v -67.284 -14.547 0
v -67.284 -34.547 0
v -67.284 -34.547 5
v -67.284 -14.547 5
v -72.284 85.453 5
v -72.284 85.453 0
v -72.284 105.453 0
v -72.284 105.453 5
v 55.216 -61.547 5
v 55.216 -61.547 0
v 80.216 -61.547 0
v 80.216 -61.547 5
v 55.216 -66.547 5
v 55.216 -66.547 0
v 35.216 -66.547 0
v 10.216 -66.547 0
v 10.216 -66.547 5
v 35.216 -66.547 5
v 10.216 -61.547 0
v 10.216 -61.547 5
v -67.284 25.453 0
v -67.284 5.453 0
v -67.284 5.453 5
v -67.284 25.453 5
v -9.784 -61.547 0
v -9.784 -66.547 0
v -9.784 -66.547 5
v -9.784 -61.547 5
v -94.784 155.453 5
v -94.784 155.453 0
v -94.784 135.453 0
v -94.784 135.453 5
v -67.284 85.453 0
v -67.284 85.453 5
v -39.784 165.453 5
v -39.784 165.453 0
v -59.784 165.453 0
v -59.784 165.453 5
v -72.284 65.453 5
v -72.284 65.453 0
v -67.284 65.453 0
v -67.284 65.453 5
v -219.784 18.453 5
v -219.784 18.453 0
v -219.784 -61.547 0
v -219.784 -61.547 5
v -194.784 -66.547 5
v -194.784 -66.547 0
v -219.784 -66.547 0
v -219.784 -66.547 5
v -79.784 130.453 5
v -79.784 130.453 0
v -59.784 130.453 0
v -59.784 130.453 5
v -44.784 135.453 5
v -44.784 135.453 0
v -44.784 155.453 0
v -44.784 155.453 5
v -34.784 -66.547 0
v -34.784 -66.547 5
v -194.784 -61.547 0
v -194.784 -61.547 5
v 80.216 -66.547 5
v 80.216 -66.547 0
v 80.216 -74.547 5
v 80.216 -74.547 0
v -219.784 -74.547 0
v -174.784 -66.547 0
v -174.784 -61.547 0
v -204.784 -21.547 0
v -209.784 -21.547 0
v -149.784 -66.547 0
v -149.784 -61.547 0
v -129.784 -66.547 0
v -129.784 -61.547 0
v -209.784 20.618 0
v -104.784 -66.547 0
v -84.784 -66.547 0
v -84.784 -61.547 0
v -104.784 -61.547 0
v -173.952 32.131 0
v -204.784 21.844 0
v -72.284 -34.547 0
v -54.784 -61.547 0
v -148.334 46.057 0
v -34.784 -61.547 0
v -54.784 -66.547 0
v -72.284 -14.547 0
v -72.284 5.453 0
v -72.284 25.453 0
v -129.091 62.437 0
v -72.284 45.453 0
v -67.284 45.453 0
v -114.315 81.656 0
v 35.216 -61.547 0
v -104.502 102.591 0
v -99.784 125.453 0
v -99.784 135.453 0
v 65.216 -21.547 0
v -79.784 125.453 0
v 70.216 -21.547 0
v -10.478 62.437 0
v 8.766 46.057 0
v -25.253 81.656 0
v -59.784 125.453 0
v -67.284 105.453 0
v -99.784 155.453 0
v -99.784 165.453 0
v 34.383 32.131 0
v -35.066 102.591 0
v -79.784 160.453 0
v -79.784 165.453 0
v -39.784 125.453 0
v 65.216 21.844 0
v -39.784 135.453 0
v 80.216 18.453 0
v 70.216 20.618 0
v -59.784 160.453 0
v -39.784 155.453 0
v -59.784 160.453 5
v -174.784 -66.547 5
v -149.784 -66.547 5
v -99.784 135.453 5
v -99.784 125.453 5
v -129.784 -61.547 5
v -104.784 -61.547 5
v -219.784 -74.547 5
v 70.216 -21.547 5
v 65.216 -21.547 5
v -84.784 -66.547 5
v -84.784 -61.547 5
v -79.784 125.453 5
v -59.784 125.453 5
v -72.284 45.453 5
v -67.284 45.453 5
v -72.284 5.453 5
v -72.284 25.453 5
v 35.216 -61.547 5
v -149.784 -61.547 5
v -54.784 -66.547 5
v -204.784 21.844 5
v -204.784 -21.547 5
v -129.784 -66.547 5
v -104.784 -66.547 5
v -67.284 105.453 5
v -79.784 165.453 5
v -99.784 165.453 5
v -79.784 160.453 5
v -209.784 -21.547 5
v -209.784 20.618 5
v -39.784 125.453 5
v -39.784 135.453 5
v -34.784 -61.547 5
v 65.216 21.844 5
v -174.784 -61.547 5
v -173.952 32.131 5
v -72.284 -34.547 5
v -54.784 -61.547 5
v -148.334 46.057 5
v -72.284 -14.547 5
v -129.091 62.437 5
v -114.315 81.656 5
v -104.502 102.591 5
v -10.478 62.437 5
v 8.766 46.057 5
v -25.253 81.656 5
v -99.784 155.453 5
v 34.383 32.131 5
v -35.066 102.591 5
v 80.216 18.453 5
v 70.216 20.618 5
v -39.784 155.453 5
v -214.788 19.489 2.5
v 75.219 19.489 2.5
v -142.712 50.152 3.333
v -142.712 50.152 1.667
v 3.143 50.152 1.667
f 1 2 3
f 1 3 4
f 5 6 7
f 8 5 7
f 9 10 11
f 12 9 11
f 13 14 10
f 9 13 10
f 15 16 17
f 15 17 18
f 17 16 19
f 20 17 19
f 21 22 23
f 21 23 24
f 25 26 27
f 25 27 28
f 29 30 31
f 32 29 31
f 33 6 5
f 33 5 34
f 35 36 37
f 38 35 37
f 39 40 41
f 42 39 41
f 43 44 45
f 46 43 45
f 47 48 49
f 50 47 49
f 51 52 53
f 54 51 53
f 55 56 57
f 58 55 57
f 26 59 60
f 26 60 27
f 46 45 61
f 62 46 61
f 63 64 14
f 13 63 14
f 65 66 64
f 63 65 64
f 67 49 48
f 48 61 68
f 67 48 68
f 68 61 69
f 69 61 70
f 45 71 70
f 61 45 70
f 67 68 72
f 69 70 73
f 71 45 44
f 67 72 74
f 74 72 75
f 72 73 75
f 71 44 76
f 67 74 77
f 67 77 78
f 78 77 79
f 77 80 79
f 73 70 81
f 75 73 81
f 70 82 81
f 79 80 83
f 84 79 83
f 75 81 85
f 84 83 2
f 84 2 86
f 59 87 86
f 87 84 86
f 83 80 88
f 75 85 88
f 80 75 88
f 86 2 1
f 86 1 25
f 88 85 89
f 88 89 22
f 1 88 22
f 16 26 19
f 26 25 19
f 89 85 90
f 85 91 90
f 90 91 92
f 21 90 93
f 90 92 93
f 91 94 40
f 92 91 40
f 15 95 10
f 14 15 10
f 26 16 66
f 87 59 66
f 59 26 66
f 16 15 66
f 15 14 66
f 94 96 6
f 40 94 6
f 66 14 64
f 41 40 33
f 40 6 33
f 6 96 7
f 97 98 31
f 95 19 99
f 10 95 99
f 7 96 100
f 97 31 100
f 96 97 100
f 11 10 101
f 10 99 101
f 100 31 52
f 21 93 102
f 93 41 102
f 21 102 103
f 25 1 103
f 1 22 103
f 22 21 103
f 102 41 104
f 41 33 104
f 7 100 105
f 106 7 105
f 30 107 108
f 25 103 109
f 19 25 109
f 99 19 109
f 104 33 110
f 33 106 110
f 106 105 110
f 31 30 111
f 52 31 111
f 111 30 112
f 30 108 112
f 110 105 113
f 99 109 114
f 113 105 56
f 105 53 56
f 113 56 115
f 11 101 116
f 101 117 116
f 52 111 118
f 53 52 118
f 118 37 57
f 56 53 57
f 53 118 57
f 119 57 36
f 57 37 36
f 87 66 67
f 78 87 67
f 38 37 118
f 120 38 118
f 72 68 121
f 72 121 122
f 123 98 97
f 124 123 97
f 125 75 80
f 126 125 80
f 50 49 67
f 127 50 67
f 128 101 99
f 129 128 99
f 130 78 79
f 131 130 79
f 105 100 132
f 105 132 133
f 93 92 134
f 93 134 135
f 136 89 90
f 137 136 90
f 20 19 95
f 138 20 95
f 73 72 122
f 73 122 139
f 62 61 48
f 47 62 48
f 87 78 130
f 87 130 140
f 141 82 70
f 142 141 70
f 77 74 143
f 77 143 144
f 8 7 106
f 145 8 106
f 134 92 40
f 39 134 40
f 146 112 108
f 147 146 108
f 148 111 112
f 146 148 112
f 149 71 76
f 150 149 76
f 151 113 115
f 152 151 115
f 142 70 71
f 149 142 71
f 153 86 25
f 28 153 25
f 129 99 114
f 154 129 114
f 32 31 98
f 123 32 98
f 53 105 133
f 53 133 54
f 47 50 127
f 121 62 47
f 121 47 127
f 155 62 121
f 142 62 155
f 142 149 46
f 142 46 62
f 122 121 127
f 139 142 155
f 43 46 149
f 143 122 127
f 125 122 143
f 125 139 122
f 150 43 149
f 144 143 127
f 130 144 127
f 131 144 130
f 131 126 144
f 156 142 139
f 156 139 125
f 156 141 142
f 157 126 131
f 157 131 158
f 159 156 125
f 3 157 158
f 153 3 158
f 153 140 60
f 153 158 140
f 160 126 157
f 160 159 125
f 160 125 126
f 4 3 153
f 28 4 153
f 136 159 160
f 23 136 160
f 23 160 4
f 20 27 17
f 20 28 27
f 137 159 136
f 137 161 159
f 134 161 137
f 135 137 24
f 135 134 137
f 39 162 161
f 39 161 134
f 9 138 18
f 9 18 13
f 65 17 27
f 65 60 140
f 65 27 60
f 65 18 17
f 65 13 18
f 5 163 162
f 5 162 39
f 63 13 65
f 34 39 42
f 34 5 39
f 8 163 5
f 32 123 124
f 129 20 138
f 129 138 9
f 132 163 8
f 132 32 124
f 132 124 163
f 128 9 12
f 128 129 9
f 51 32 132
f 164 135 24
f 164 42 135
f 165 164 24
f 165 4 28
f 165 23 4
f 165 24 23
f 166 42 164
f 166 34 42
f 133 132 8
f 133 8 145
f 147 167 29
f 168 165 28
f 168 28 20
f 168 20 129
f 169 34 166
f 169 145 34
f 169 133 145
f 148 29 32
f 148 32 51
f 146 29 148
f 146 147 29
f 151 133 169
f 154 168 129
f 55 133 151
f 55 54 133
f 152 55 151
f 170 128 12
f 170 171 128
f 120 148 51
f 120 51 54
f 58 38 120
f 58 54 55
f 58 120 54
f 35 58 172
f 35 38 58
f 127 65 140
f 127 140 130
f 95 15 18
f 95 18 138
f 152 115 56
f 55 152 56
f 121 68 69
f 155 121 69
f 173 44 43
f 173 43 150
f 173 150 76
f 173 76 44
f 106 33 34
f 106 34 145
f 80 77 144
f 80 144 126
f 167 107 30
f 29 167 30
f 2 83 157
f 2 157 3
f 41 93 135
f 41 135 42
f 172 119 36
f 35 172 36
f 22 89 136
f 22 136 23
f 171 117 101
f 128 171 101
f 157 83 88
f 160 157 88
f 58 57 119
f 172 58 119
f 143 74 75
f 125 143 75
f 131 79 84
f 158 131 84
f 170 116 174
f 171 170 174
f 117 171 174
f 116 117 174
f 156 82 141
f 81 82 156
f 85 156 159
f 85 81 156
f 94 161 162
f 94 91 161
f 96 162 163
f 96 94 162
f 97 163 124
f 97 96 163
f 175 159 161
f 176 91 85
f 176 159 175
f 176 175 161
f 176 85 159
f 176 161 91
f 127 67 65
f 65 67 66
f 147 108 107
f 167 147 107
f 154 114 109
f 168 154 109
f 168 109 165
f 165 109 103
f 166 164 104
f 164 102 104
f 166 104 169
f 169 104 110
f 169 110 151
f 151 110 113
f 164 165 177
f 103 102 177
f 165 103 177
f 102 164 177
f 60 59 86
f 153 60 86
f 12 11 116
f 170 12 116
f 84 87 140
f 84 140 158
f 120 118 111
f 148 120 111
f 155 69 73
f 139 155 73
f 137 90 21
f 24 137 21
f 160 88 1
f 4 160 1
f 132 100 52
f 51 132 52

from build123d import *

# Parameters (mm, degrees)
SKETCH1_W           = 20
SKETCH1_H           = 5
SKETCH1_W_2         = 5
SKETCH1_H_2         = 20
SKETCH1_W_3         = 25
SKETCH1_W_4         = 30
BOSS_EXTRUDE1_DEPTH = 5


with BuildPart() as part:
    # Sketch1 → Boss-Extrude1 (new body)
    with BuildSketch(Plane.XY):
        with BuildLine():
            Line((-39.784412909, 125.453201578), (-39.784412909, 135.453201578))
            Line((-39.784412909, 135.453201578), (-44.784412909, 135.453201578))
            Line((-44.784412909, 135.453201578), (-44.784412909, 155.453201578))
            Line((-44.784412909, 155.453201578), (-39.784412909, 155.453201578))
            Line((-39.784412909, 155.453201578), (-39.784412909, 165.453201578))
            Line((-39.784412909, 165.453201578), (-59.784412909, 165.453201578))
            Line((-59.784412909, 165.453201578), (-59.784412909, 160.453201578))
            Line((-59.784412909, 160.453201578), (-79.784412909, 160.453201578))
            Line((-79.784412909, 160.453201578), (-79.784412909, 165.453201578))
            Line((-79.784412909, 165.453201578), (-99.784412909, 165.453201578))
            Line((-99.784412909, 165.453201578), (-99.784412909, 155.453201578))
            Line((-99.784412909, 155.453201578), (-94.784412909, 155.453201578))
            Line((-94.784412909, 155.453201578), (-94.784412909, 135.453201578))
            Line((-94.784412909, 135.453201578), (-99.784412909, 135.453201578))
            Line((-99.784412909, 135.453201578), (-99.784412909, 125.453201578))
            add(Edge.make_bspline(
                [(-204.784412909, 21.843580993), (-197.506230119, 23.701939803), (-175.474625692, 30.348491442), (-128.147146094, 54.275433129), (-102.183870773, 95.209842597), (-99.784412909, 125.453201578)],
                knots=[0.089716065, 0.089716065, 0.089716065, 0.089716065, 0.220283612, 0.4864068, 1, 1, 1, 1], degree=3))
            Line((-204.784412909, 21.843580993), (-204.784412909, -21.546798422))
            Line((-204.784412909, -21.546798422), (-209.784412909, -21.546798422))
            Line((-209.784412909, -21.546798422), (-209.784412909, 20.618388045))
            add(Edge.make_bspline(
                [(-219.784412909, 18.453201578), (-214.791132261, 19.441715958), (-209.784412909, 20.618388045)],
                knots=[0, 0, 0, 0.0598328, 0.0598328, 0.0598328], degree=2))
            Line((-219.784412909, 18.453201578), (-219.784412909, -61.546798422))
            Line((-219.784412909, -61.546798422), (-194.784412909, -61.546798422))
            Line((-194.784412909, -61.546798422), (-194.784412909, -66.546798422))
            Line((-194.784412909, -66.546798422), (-219.784412909, -66.546798422))
            Line((-219.784412909, -66.546798422), (-219.784412909, -74.546798422))
            Line((-219.784412909, -74.546798422), (80.215587091, -74.546798422))
            Line((80.215587091, -74.546798422), (80.215587091, -66.546798422))
            Line((80.215587091, -66.546798422), (55.215587091, -66.546798422))
            Line((55.215587091, -66.546798422), (55.215587091, -61.546798422))
            Line((55.215587091, -61.546798422), (80.215587091, -61.546798422))
            Line((80.215587091, -61.546798422), (80.215587091, 18.453201578))
            add(Edge.make_bspline(
                [(80.215587091, 18.453201578), (75.222306443, 19.441715958), (70.215587091, 20.618388045)],
                knots=[0, 0, 0, 0.0598328, 0.0598328, 0.0598328], degree=2))
            Line((70.215587091, 20.618388045), (70.215587091, -21.546798422))
            Line((70.215587091, -21.546798422), (65.215587091, -21.546798422))
            Line((65.215587091, -21.546798422), (65.215587091, 21.843580993))
            add(Edge.make_bspline(
                [(65.215587091, 21.843580993), (57.937404301, 23.701939803), (35.905799874, 30.348491442), (-11.421679724, 54.275433129), (-37.384955046, 95.209842597), (-39.784412909, 125.453201578)],
                knots=[0.089716065, 0.089716065, 0.089716065, 0.089716065, 0.220283612, 0.4864068, 1, 1, 1, 1], degree=3))
        make_face()
        with Locations((-69.784412909, 127.953201578)):
            Rectangle(SKETCH1_W, SKETCH1_H, mode=Mode.SUBTRACT)
        with Locations((-69.784412909, 55.453201578)):
            Rectangle(SKETCH1_W_2, SKETCH1_H_2, mode=Mode.SUBTRACT)
        with Locations((-69.784412909, 95.453201578)):
            Rectangle(SKETCH1_W_2, SKETCH1_H_2, mode=Mode.SUBTRACT)
        with Locations((22.715587091, -64.046798422)):
            Rectangle(SKETCH1_W_3, SKETCH1_H, mode=Mode.SUBTRACT)
        with Locations((-22.284412909, -64.046798422)):
            Rectangle(SKETCH1_W_3, SKETCH1_H, mode=Mode.SUBTRACT)
        with Locations((-69.784412909, -64.046798422)):
            Rectangle(SKETCH1_W_4, SKETCH1_H, mode=Mode.SUBTRACT)
        with Locations((-117.284412909, -64.046798422)):
            Rectangle(SKETCH1_W_3, SKETCH1_H, mode=Mode.SUBTRACT)
        with Locations((-162.284412909, -64.046798422)):
            Rectangle(SKETCH1_W_3, SKETCH1_H, mode=Mode.SUBTRACT)
        with Locations((-69.784412909, 15.453201578)):
            Rectangle(SKETCH1_W_2, SKETCH1_H_2, mode=Mode.SUBTRACT)
        with Locations((-69.784412909, -24.546798422)):
            Rectangle(SKETCH1_W_2, SKETCH1_H_2, mode=Mode.SUBTRACT)
    extrude(amount=BOSS_EXTRUDE1_DEPTH)


solid = part.part
